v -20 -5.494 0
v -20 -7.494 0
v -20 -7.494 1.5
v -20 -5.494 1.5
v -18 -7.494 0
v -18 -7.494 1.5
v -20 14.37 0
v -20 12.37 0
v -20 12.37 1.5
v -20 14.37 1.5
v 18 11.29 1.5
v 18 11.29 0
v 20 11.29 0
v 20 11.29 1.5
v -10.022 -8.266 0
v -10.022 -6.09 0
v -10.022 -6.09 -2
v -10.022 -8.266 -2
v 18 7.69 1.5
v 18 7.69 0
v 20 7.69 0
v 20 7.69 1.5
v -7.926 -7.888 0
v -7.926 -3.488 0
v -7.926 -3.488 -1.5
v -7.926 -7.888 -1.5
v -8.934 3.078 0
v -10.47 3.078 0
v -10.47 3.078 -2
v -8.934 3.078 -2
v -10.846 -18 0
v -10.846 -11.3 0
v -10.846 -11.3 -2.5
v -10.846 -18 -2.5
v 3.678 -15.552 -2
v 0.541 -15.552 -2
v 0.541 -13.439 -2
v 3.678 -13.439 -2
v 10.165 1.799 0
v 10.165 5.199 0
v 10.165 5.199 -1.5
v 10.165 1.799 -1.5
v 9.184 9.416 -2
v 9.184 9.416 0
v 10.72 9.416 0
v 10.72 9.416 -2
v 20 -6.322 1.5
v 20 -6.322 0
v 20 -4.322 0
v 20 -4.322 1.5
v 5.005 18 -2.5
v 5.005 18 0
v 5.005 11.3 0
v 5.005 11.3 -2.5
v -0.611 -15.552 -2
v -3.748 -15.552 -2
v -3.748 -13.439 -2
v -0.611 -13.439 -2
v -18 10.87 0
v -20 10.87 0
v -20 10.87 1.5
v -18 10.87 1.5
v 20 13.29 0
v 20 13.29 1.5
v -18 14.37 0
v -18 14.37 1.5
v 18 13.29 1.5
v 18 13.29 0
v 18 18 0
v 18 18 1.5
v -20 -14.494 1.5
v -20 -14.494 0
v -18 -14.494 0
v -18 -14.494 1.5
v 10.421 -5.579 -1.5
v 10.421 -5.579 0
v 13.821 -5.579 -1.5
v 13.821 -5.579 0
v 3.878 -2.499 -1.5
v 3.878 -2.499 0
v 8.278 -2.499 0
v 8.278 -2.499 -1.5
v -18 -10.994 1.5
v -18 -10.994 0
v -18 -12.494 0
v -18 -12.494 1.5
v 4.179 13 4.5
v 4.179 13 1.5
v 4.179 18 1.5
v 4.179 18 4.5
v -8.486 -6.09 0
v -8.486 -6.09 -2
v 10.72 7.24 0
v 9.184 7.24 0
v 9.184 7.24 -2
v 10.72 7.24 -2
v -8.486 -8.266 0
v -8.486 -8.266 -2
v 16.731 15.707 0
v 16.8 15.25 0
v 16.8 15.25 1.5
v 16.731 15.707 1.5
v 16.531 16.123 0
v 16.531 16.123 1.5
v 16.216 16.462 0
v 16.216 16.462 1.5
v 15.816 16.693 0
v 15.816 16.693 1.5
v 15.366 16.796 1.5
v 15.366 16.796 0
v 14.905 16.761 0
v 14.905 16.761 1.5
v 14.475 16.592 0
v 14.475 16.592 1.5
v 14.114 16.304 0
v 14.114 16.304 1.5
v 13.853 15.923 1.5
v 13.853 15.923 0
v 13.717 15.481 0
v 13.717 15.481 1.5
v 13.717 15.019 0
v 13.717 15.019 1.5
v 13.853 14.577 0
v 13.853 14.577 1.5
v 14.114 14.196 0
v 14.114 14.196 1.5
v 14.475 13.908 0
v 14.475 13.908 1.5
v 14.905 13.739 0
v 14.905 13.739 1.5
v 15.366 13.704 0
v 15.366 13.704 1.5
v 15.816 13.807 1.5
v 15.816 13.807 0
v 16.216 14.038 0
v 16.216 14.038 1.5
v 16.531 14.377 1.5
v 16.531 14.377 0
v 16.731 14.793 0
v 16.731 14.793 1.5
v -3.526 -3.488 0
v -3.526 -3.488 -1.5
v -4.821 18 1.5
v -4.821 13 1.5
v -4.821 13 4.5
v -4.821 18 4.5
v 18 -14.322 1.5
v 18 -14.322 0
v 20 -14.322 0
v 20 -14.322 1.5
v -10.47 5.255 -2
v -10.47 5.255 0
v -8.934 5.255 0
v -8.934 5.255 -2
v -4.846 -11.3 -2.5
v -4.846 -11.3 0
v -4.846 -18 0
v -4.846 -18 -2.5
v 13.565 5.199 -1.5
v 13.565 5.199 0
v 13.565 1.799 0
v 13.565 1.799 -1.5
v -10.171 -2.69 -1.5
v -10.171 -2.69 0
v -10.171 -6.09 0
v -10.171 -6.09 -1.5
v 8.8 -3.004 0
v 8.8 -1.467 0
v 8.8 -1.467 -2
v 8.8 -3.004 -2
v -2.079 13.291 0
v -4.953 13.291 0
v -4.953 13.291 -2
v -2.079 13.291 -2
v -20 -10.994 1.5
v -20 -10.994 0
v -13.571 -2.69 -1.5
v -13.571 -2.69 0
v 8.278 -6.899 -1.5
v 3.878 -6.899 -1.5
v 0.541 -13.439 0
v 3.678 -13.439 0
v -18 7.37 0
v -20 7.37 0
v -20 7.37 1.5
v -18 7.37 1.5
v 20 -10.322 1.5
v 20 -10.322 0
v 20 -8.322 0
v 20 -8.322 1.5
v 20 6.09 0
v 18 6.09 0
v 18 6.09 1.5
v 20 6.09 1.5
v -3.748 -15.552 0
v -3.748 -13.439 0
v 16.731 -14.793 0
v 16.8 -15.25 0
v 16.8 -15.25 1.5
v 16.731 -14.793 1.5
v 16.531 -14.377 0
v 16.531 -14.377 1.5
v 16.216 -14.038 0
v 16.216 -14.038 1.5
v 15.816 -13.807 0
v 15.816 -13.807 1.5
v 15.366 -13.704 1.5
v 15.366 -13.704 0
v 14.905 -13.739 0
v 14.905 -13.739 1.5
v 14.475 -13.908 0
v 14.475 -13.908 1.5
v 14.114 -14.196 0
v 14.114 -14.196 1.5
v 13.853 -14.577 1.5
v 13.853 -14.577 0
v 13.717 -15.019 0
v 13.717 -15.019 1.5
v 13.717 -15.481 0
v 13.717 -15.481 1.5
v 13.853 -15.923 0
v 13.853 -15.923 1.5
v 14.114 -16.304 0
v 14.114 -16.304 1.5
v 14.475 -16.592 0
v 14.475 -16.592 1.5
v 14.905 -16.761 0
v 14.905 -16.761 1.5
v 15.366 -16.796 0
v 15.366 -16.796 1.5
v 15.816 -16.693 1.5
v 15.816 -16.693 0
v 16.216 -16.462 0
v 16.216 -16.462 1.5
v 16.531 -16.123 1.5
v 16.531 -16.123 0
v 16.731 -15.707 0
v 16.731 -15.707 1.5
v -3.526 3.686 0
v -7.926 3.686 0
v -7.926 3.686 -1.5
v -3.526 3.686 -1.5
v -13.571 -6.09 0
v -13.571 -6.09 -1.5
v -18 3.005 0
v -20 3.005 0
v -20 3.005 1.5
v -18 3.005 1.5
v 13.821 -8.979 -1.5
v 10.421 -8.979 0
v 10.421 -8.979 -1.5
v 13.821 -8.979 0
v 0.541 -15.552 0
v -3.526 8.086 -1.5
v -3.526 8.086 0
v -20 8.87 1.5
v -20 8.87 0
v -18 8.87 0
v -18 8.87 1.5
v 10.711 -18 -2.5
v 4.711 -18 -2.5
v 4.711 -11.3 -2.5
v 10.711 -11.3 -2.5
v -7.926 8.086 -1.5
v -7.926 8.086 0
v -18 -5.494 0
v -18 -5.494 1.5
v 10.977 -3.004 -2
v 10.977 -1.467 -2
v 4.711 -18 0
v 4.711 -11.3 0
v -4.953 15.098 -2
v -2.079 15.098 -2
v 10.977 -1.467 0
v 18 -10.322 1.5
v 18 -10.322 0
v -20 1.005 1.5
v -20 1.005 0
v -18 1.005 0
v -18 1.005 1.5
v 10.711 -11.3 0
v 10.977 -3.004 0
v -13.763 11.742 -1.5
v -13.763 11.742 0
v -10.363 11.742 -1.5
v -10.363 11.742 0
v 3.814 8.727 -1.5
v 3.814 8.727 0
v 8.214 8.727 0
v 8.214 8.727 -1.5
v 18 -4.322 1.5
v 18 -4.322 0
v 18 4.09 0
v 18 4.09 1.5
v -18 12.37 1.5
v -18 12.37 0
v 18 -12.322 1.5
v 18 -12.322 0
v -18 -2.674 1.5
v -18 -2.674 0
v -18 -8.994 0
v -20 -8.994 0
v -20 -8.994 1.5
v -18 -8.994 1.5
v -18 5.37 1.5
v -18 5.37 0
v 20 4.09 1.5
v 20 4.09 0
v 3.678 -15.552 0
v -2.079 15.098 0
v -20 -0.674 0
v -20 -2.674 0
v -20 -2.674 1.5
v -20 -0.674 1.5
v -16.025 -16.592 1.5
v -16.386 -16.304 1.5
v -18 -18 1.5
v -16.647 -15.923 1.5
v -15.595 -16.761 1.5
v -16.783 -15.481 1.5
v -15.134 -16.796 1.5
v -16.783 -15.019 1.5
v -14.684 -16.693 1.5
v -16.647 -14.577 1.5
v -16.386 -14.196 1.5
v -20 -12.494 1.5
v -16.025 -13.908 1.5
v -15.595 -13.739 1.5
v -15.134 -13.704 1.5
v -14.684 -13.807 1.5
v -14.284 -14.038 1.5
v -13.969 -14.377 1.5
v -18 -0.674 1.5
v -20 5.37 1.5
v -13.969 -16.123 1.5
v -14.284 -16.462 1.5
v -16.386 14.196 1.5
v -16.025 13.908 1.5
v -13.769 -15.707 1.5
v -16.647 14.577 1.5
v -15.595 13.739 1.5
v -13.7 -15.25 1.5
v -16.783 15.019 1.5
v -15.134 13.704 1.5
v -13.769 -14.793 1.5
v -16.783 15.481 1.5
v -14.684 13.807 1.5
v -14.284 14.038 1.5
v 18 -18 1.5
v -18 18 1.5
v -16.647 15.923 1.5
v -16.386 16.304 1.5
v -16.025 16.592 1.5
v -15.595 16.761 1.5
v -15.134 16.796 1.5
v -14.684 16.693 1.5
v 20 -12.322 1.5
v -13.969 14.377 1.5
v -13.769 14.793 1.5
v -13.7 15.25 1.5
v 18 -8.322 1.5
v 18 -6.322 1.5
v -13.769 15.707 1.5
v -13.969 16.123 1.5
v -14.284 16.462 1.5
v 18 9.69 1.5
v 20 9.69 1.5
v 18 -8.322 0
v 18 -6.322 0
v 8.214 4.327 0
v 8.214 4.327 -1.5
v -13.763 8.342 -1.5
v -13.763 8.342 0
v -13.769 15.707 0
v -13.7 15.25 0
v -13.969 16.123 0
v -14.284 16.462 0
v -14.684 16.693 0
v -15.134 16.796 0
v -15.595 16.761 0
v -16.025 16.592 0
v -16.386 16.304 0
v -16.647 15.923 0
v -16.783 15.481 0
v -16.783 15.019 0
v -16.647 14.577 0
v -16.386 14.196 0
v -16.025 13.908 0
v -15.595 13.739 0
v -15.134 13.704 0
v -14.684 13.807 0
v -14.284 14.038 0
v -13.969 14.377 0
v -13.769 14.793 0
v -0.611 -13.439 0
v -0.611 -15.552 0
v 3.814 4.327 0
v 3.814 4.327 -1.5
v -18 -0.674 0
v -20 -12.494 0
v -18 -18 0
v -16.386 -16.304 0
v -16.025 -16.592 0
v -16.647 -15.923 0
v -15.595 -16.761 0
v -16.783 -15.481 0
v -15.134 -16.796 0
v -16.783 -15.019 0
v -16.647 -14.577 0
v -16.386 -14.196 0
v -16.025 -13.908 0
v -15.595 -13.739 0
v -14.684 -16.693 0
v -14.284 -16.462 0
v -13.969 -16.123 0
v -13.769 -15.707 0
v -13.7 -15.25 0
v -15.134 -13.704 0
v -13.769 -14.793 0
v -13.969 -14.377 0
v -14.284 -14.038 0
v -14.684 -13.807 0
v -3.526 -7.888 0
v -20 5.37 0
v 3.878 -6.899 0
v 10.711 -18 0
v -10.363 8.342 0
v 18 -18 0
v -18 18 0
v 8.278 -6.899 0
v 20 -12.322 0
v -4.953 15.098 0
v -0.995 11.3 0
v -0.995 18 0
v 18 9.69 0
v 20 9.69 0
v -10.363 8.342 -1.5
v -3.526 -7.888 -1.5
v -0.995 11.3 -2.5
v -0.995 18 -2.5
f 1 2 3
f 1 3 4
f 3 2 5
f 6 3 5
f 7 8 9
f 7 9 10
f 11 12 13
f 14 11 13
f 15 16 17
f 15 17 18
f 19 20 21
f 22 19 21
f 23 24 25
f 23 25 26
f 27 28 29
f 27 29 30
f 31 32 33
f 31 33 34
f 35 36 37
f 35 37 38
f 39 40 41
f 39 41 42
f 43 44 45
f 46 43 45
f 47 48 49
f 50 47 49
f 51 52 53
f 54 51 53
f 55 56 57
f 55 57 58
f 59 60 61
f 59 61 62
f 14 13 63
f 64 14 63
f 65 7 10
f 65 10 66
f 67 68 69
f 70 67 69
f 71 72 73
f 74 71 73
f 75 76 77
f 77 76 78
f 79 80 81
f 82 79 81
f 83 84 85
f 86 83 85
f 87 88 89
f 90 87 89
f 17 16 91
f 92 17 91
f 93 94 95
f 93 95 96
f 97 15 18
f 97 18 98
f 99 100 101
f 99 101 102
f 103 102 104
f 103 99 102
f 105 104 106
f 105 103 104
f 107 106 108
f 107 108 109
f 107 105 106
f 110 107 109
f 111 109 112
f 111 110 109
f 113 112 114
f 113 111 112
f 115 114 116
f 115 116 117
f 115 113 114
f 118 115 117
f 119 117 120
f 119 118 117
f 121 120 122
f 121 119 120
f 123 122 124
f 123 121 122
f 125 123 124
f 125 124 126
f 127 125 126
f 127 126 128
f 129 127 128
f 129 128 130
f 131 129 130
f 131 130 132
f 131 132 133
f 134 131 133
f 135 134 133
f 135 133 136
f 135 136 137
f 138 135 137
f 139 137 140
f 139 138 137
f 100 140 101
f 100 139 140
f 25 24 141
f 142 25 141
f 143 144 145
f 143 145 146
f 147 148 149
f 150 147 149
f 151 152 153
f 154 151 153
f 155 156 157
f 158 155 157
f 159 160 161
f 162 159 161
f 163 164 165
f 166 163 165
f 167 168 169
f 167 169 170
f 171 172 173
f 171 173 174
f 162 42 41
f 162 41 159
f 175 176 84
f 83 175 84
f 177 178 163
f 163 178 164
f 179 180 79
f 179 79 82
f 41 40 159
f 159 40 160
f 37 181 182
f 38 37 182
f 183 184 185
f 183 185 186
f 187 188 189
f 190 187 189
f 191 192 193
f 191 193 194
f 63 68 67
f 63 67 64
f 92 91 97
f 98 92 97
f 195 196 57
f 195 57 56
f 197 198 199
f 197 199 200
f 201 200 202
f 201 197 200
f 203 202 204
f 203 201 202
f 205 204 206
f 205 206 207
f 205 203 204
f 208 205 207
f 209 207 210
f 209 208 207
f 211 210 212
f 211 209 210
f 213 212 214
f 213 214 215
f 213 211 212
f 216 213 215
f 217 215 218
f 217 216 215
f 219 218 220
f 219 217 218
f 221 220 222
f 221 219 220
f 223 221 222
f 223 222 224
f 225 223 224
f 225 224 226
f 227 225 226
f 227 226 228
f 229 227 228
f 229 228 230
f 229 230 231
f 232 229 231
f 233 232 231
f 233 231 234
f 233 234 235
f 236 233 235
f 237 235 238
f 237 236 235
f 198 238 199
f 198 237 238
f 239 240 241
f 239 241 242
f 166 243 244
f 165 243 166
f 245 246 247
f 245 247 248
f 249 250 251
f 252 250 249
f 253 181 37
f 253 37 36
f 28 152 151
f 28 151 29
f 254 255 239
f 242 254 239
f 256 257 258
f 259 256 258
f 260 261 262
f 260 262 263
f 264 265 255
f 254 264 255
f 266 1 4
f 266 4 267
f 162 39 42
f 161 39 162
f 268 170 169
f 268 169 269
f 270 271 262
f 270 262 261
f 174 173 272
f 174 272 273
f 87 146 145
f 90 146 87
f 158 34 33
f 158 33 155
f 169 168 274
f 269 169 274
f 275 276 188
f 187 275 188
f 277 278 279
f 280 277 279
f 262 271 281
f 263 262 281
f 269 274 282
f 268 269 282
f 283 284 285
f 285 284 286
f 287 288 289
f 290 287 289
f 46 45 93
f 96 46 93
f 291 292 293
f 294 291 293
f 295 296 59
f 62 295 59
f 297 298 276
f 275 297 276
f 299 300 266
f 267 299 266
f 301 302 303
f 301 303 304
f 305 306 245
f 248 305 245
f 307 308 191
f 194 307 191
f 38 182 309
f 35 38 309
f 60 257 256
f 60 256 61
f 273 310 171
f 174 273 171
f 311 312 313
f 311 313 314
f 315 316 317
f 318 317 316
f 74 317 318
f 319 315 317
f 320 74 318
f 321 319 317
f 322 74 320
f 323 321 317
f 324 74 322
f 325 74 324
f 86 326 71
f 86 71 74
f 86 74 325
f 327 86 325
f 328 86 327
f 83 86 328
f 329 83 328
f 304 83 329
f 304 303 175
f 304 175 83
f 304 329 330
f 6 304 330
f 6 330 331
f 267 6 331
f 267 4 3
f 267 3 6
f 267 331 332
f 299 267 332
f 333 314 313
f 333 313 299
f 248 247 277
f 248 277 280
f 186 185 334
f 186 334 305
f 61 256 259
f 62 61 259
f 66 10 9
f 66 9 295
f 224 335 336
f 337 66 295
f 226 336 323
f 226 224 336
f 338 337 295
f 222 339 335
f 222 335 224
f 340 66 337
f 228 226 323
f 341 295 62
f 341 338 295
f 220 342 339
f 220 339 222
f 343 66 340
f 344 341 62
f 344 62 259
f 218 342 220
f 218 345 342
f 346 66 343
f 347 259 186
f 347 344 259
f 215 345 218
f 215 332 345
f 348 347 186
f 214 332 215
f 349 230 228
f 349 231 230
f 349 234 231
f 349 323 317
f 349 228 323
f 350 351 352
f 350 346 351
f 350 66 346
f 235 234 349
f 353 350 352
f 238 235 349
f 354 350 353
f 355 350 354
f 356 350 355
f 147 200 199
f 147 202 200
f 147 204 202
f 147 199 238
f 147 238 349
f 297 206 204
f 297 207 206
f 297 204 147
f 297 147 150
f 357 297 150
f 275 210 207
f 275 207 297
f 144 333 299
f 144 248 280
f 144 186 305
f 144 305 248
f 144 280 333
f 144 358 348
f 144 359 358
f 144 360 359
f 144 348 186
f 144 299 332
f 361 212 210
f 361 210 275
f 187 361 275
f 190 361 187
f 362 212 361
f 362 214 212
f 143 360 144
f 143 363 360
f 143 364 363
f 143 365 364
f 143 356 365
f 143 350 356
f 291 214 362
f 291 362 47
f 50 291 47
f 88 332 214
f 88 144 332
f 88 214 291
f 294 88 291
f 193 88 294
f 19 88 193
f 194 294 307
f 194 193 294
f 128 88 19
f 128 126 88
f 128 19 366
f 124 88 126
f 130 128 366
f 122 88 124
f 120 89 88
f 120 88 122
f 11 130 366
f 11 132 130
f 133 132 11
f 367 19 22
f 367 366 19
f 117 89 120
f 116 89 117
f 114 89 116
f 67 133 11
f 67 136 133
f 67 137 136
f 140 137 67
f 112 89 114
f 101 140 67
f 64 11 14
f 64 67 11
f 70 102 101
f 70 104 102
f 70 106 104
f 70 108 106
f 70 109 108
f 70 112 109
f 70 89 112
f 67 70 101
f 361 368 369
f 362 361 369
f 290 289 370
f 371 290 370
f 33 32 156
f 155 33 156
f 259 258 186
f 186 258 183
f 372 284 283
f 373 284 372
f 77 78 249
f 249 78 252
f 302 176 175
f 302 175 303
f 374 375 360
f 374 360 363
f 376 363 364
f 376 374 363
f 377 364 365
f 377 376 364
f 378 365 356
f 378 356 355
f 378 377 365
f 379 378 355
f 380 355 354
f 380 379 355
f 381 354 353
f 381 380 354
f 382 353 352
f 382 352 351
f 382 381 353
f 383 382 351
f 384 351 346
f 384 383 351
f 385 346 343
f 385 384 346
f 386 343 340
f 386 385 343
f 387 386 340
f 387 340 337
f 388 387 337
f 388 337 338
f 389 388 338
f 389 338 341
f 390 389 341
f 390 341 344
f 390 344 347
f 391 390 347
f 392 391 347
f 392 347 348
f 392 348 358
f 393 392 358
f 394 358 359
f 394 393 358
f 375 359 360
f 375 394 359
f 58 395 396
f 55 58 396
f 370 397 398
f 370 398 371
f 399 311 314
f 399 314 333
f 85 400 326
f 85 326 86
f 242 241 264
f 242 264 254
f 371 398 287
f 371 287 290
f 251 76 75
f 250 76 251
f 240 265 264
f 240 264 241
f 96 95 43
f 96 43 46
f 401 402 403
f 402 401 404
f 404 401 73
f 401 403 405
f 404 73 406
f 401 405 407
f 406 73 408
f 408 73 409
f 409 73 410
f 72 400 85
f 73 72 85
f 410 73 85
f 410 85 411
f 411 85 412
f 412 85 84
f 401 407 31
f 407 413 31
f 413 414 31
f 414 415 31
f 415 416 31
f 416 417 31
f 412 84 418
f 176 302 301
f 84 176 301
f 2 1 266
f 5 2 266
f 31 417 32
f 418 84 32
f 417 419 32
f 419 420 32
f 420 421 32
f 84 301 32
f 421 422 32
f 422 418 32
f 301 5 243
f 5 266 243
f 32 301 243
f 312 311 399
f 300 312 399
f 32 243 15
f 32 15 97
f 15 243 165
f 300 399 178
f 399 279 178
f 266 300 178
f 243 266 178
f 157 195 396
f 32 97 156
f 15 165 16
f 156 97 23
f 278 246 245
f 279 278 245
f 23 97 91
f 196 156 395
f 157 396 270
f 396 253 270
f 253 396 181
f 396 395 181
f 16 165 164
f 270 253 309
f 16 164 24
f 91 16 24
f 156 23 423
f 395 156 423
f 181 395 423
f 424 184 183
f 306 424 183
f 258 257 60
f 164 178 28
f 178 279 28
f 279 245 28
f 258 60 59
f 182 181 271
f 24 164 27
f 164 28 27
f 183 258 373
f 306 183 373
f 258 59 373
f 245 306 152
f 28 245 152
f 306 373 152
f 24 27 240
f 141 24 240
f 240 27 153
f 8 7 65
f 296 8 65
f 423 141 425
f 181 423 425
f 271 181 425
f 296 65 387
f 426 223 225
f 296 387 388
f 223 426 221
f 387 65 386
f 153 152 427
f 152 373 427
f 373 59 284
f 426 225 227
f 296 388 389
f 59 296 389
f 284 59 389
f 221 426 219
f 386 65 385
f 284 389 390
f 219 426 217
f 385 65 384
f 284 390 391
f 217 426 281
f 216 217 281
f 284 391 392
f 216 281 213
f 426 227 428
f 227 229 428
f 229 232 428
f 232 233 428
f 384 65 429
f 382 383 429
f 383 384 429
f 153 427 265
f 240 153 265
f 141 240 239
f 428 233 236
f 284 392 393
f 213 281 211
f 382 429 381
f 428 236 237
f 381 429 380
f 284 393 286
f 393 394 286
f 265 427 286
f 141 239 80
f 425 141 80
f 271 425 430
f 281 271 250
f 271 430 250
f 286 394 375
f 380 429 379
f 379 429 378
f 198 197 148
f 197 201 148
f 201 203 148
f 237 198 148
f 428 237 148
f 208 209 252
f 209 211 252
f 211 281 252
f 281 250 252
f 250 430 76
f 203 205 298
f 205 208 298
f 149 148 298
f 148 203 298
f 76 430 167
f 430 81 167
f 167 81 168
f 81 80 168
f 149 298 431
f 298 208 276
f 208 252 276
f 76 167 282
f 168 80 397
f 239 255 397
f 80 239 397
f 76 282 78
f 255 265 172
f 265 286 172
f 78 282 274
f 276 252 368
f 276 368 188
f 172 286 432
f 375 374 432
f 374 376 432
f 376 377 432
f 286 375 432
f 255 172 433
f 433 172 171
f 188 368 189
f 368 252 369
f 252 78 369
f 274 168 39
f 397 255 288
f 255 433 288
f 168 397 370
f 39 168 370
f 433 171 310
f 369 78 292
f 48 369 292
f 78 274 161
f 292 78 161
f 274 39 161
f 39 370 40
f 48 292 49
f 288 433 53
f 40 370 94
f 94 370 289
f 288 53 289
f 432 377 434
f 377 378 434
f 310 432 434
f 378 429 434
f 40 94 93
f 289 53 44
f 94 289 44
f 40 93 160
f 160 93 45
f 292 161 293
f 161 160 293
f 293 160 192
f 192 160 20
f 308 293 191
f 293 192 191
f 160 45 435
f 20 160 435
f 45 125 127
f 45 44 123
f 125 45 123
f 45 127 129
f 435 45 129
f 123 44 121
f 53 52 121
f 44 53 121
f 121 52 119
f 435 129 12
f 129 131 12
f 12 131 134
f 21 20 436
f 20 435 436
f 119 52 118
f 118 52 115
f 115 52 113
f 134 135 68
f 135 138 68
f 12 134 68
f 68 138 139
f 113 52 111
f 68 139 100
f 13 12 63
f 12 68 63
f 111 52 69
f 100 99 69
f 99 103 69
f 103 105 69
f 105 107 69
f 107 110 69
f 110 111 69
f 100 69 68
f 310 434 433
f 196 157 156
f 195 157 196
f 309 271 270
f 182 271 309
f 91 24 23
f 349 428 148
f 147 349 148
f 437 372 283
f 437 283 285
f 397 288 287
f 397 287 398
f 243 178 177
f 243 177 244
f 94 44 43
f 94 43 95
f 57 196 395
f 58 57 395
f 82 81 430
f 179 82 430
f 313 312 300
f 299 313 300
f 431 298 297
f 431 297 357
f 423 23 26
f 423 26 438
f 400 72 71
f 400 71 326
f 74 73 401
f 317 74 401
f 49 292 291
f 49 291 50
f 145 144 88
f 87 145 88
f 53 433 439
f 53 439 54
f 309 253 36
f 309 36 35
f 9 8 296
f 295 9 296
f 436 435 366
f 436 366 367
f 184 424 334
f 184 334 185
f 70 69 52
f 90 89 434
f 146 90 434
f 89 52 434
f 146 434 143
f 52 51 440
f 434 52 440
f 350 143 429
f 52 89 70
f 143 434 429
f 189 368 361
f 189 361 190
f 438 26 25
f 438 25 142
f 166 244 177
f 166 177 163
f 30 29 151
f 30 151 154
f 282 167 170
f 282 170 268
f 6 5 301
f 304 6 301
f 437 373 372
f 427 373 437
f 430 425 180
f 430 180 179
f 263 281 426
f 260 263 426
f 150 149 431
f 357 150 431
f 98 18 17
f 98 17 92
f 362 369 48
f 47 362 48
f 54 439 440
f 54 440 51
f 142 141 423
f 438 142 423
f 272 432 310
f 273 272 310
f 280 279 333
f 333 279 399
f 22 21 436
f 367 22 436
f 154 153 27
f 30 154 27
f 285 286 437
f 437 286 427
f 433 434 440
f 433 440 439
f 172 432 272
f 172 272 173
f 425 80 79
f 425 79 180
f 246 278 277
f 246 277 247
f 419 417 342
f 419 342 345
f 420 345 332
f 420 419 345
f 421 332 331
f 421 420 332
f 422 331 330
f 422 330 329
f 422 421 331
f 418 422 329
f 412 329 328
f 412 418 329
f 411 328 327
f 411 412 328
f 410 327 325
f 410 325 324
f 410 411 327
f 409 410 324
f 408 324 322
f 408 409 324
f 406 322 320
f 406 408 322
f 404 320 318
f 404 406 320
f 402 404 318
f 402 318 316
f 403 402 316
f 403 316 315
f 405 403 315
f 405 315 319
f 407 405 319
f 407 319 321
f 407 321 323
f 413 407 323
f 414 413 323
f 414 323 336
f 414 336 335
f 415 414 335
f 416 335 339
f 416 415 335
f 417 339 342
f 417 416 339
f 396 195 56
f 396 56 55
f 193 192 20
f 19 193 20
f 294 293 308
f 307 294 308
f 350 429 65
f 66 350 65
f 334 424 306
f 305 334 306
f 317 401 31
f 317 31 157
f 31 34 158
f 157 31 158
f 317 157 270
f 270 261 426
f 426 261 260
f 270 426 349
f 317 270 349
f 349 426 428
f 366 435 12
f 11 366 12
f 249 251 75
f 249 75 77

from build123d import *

# Parameters (mm, degrees)
F2_R     = 1.55
F2_W     = 2
F2_H     = 2
F3_DEPTH = 1.5
F4_W     = 9
F4_H     = 5
F5_DEPTH = 3
F6_W     = 6
F6_H     = 6.7
F7_DEPTH = 2.5
F6_W_2   = 3.4
F6_H_2   = 3.4
F6_W_3   = 4.4
F6_H_3   = 4.4
F8_DEPTH = 1.5
F6_W_4   = 1.536496
F6_H_4   = 2.176703
F6_H_5   = 2.176704
F6_W_5   = 2.874283
F6_H_6   = 1.806834
F6_W_6   = 2.176703
F6_H_7   = 1.536496
F6_W_7   = 3.137013
F6_H_8   = 2.112682
F9_DEPTH = 2


with BuildPart() as f3:
    # F2 (on Top) → F3 (new body)
    with BuildSketch(Plane.XY):
        Polygon((18, 18), (-18, 18), (-18, 14.369573), (-18, 12.369573), (-18, 10.869573), (-18, 8.869573), (-18, 7.369573), (-18, 5.369573), (-18, 3.005002), (-18, 1.005002), (-18, -0.673528), (-18, -2.673528), (-18, -5.493983), (-18, -7.493983), (-18, -8.993983), (-18, -10.993983), (-18, -12.493983), (-18, -14.493983), (-18, -18), (18, -18), (18, -14.322089), (18, -12.322089), (18, -10.322089), (18, -8.322089), (18, -6.322089), (18, -4.322089), (18, 4.09024), (18, 6.09024), (18, 7.69024), (18, 9.69024), (18, 11.29024), (18, 13.29024), align=None)
        with Locations((-15.25, -15.25)):
            Circle(F2_R, mode=Mode.SUBTRACT)
        with Locations((15.25, -15.25)):
            Circle(F2_R, mode=Mode.SUBTRACT)
        with Locations((-15.25, 15.25)):
            Circle(F2_R, mode=Mode.SUBTRACT)
        with Locations((15.25, 15.25)):
            Circle(F2_R, mode=Mode.SUBTRACT)
        with Locations((-19, 13.369573)):
            Rectangle(F2_W, F2_H)
        with Locations((19, 12.29024)):
            Rectangle(F2_W, F2_H)
        with Locations((-19, 9.869573)):
            Rectangle(F2_W, F2_H)
        with Locations((19, 8.69024)):
            Rectangle(F2_W, F2_H)
        with Locations((-19, 6.369573)):
            Rectangle(F2_W, F2_H)
        with Locations((19, 5.09024)):
            Rectangle(F2_W, F2_H)
        with Locations((-19, 2.005002)):
            Rectangle(F2_W, F2_H)
        with Locations((19, -5.322089)):
            Rectangle(F2_W, F2_H)
        with Locations((-19, -1.673528)):
            Rectangle(F2_W, F2_H)
        with Locations((19, -9.322089)):
            Rectangle(F2_W, F2_H)
        with Locations((-19, -6.493983)):
            Rectangle(F2_W, F2_H)
        with Locations((19, -13.322089)):
            Rectangle(F2_W, F2_H)
        with Locations((-19, -9.993983)):
            Rectangle(F2_W, F2_H)
        with Locations((-19, -13.493983)):
            Rectangle(F2_W, F2_H)
    extrude(amount=F3_DEPTH)

    # F4 (on face) → F5 (join)
    with BuildSketch(Plane.XY.offset(1.5)):
        with Locations((-0.321198, 15.5)):
            Rectangle(F4_W, F4_H)
    extrude(amount=F5_DEPTH)

    # F6 (on face) → F7 (join)
    with BuildSketch(Plane(origin=(0, 0, 0), x_dir=(1, 0, 0), z_dir=(0, 0, -1))):
        with Locations((2.004663, -14.65)):
            Rectangle(F6_W, F6_H)
        with Locations((-7.845552, 14.65)):
            Rectangle(F6_W, F6_H)
        with Locations((7.711476, 14.65)):
            Rectangle(F6_W, F6_H)
    extrude(amount=F7_DEPTH)

    # F6 (on face) → F8 (join)
    with BuildSketch(Plane(origin=(0, 0, 0), x_dir=(1, 0, 0), z_dir=(0, 0, -1))):
        with Locations((-12.063461, -10.042248)):
            Rectangle(F6_W_2, F6_H_2)
        with Locations((-5.725725, -5.885644)):
            Rectangle(F6_W_3, F6_H_3)
        with Locations((6.013899, -6.527154)):
            Rectangle(F6_W_3, F6_H_3)
        with Locations((11.864845, -3.498852)):
            Rectangle(F6_W_2, F6_H_2)
        with Locations((12.121448, 7.278509)):
            Rectangle(F6_W_2, F6_H_2)
        with Locations((6.078051, 4.699263)):
            Rectangle(F6_W_3, F6_H_3)
        with Locations((-5.725725, 5.687943)):
            Rectangle(F6_W_3, F6_H_3)
        with Locations((-11.871008, 4.389598)):
            Rectangle(F6_W_2, F6_H_2)
    extrude(amount=F8_DEPTH)

    # F6 (on face) → F9 (join)
    with BuildSketch(Plane(origin=(0, 0, 0), x_dir=(1, 0, 0), z_dir=(0, 0, -1))):
        with Locations((-9.702151, -4.16677)):
            Rectangle(F6_W_4, F6_H_4)
        with Locations((-9.254006, 7.17795)):
            Rectangle(F6_W_4, F6_H_4)
        with Locations((9.9522, -8.328114)):
            Rectangle(F6_W_4, F6_H_5)
        with Locations((-3.516199, -14.194596)):
            Rectangle(F6_W_5, F6_H_6)
        with Locations((9.888179, 2.235299)):
            Rectangle(F6_W_6, F6_H_7)
        with Locations((-2.17972, 14.495261)):
            Rectangle(F6_W_7, F6_H_8)
        with Locations((2.109666, 14.495261)):
            Rectangle(F6_W_7, F6_H_8)
    extrude(amount=F9_DEPTH)


solid = f3.part
